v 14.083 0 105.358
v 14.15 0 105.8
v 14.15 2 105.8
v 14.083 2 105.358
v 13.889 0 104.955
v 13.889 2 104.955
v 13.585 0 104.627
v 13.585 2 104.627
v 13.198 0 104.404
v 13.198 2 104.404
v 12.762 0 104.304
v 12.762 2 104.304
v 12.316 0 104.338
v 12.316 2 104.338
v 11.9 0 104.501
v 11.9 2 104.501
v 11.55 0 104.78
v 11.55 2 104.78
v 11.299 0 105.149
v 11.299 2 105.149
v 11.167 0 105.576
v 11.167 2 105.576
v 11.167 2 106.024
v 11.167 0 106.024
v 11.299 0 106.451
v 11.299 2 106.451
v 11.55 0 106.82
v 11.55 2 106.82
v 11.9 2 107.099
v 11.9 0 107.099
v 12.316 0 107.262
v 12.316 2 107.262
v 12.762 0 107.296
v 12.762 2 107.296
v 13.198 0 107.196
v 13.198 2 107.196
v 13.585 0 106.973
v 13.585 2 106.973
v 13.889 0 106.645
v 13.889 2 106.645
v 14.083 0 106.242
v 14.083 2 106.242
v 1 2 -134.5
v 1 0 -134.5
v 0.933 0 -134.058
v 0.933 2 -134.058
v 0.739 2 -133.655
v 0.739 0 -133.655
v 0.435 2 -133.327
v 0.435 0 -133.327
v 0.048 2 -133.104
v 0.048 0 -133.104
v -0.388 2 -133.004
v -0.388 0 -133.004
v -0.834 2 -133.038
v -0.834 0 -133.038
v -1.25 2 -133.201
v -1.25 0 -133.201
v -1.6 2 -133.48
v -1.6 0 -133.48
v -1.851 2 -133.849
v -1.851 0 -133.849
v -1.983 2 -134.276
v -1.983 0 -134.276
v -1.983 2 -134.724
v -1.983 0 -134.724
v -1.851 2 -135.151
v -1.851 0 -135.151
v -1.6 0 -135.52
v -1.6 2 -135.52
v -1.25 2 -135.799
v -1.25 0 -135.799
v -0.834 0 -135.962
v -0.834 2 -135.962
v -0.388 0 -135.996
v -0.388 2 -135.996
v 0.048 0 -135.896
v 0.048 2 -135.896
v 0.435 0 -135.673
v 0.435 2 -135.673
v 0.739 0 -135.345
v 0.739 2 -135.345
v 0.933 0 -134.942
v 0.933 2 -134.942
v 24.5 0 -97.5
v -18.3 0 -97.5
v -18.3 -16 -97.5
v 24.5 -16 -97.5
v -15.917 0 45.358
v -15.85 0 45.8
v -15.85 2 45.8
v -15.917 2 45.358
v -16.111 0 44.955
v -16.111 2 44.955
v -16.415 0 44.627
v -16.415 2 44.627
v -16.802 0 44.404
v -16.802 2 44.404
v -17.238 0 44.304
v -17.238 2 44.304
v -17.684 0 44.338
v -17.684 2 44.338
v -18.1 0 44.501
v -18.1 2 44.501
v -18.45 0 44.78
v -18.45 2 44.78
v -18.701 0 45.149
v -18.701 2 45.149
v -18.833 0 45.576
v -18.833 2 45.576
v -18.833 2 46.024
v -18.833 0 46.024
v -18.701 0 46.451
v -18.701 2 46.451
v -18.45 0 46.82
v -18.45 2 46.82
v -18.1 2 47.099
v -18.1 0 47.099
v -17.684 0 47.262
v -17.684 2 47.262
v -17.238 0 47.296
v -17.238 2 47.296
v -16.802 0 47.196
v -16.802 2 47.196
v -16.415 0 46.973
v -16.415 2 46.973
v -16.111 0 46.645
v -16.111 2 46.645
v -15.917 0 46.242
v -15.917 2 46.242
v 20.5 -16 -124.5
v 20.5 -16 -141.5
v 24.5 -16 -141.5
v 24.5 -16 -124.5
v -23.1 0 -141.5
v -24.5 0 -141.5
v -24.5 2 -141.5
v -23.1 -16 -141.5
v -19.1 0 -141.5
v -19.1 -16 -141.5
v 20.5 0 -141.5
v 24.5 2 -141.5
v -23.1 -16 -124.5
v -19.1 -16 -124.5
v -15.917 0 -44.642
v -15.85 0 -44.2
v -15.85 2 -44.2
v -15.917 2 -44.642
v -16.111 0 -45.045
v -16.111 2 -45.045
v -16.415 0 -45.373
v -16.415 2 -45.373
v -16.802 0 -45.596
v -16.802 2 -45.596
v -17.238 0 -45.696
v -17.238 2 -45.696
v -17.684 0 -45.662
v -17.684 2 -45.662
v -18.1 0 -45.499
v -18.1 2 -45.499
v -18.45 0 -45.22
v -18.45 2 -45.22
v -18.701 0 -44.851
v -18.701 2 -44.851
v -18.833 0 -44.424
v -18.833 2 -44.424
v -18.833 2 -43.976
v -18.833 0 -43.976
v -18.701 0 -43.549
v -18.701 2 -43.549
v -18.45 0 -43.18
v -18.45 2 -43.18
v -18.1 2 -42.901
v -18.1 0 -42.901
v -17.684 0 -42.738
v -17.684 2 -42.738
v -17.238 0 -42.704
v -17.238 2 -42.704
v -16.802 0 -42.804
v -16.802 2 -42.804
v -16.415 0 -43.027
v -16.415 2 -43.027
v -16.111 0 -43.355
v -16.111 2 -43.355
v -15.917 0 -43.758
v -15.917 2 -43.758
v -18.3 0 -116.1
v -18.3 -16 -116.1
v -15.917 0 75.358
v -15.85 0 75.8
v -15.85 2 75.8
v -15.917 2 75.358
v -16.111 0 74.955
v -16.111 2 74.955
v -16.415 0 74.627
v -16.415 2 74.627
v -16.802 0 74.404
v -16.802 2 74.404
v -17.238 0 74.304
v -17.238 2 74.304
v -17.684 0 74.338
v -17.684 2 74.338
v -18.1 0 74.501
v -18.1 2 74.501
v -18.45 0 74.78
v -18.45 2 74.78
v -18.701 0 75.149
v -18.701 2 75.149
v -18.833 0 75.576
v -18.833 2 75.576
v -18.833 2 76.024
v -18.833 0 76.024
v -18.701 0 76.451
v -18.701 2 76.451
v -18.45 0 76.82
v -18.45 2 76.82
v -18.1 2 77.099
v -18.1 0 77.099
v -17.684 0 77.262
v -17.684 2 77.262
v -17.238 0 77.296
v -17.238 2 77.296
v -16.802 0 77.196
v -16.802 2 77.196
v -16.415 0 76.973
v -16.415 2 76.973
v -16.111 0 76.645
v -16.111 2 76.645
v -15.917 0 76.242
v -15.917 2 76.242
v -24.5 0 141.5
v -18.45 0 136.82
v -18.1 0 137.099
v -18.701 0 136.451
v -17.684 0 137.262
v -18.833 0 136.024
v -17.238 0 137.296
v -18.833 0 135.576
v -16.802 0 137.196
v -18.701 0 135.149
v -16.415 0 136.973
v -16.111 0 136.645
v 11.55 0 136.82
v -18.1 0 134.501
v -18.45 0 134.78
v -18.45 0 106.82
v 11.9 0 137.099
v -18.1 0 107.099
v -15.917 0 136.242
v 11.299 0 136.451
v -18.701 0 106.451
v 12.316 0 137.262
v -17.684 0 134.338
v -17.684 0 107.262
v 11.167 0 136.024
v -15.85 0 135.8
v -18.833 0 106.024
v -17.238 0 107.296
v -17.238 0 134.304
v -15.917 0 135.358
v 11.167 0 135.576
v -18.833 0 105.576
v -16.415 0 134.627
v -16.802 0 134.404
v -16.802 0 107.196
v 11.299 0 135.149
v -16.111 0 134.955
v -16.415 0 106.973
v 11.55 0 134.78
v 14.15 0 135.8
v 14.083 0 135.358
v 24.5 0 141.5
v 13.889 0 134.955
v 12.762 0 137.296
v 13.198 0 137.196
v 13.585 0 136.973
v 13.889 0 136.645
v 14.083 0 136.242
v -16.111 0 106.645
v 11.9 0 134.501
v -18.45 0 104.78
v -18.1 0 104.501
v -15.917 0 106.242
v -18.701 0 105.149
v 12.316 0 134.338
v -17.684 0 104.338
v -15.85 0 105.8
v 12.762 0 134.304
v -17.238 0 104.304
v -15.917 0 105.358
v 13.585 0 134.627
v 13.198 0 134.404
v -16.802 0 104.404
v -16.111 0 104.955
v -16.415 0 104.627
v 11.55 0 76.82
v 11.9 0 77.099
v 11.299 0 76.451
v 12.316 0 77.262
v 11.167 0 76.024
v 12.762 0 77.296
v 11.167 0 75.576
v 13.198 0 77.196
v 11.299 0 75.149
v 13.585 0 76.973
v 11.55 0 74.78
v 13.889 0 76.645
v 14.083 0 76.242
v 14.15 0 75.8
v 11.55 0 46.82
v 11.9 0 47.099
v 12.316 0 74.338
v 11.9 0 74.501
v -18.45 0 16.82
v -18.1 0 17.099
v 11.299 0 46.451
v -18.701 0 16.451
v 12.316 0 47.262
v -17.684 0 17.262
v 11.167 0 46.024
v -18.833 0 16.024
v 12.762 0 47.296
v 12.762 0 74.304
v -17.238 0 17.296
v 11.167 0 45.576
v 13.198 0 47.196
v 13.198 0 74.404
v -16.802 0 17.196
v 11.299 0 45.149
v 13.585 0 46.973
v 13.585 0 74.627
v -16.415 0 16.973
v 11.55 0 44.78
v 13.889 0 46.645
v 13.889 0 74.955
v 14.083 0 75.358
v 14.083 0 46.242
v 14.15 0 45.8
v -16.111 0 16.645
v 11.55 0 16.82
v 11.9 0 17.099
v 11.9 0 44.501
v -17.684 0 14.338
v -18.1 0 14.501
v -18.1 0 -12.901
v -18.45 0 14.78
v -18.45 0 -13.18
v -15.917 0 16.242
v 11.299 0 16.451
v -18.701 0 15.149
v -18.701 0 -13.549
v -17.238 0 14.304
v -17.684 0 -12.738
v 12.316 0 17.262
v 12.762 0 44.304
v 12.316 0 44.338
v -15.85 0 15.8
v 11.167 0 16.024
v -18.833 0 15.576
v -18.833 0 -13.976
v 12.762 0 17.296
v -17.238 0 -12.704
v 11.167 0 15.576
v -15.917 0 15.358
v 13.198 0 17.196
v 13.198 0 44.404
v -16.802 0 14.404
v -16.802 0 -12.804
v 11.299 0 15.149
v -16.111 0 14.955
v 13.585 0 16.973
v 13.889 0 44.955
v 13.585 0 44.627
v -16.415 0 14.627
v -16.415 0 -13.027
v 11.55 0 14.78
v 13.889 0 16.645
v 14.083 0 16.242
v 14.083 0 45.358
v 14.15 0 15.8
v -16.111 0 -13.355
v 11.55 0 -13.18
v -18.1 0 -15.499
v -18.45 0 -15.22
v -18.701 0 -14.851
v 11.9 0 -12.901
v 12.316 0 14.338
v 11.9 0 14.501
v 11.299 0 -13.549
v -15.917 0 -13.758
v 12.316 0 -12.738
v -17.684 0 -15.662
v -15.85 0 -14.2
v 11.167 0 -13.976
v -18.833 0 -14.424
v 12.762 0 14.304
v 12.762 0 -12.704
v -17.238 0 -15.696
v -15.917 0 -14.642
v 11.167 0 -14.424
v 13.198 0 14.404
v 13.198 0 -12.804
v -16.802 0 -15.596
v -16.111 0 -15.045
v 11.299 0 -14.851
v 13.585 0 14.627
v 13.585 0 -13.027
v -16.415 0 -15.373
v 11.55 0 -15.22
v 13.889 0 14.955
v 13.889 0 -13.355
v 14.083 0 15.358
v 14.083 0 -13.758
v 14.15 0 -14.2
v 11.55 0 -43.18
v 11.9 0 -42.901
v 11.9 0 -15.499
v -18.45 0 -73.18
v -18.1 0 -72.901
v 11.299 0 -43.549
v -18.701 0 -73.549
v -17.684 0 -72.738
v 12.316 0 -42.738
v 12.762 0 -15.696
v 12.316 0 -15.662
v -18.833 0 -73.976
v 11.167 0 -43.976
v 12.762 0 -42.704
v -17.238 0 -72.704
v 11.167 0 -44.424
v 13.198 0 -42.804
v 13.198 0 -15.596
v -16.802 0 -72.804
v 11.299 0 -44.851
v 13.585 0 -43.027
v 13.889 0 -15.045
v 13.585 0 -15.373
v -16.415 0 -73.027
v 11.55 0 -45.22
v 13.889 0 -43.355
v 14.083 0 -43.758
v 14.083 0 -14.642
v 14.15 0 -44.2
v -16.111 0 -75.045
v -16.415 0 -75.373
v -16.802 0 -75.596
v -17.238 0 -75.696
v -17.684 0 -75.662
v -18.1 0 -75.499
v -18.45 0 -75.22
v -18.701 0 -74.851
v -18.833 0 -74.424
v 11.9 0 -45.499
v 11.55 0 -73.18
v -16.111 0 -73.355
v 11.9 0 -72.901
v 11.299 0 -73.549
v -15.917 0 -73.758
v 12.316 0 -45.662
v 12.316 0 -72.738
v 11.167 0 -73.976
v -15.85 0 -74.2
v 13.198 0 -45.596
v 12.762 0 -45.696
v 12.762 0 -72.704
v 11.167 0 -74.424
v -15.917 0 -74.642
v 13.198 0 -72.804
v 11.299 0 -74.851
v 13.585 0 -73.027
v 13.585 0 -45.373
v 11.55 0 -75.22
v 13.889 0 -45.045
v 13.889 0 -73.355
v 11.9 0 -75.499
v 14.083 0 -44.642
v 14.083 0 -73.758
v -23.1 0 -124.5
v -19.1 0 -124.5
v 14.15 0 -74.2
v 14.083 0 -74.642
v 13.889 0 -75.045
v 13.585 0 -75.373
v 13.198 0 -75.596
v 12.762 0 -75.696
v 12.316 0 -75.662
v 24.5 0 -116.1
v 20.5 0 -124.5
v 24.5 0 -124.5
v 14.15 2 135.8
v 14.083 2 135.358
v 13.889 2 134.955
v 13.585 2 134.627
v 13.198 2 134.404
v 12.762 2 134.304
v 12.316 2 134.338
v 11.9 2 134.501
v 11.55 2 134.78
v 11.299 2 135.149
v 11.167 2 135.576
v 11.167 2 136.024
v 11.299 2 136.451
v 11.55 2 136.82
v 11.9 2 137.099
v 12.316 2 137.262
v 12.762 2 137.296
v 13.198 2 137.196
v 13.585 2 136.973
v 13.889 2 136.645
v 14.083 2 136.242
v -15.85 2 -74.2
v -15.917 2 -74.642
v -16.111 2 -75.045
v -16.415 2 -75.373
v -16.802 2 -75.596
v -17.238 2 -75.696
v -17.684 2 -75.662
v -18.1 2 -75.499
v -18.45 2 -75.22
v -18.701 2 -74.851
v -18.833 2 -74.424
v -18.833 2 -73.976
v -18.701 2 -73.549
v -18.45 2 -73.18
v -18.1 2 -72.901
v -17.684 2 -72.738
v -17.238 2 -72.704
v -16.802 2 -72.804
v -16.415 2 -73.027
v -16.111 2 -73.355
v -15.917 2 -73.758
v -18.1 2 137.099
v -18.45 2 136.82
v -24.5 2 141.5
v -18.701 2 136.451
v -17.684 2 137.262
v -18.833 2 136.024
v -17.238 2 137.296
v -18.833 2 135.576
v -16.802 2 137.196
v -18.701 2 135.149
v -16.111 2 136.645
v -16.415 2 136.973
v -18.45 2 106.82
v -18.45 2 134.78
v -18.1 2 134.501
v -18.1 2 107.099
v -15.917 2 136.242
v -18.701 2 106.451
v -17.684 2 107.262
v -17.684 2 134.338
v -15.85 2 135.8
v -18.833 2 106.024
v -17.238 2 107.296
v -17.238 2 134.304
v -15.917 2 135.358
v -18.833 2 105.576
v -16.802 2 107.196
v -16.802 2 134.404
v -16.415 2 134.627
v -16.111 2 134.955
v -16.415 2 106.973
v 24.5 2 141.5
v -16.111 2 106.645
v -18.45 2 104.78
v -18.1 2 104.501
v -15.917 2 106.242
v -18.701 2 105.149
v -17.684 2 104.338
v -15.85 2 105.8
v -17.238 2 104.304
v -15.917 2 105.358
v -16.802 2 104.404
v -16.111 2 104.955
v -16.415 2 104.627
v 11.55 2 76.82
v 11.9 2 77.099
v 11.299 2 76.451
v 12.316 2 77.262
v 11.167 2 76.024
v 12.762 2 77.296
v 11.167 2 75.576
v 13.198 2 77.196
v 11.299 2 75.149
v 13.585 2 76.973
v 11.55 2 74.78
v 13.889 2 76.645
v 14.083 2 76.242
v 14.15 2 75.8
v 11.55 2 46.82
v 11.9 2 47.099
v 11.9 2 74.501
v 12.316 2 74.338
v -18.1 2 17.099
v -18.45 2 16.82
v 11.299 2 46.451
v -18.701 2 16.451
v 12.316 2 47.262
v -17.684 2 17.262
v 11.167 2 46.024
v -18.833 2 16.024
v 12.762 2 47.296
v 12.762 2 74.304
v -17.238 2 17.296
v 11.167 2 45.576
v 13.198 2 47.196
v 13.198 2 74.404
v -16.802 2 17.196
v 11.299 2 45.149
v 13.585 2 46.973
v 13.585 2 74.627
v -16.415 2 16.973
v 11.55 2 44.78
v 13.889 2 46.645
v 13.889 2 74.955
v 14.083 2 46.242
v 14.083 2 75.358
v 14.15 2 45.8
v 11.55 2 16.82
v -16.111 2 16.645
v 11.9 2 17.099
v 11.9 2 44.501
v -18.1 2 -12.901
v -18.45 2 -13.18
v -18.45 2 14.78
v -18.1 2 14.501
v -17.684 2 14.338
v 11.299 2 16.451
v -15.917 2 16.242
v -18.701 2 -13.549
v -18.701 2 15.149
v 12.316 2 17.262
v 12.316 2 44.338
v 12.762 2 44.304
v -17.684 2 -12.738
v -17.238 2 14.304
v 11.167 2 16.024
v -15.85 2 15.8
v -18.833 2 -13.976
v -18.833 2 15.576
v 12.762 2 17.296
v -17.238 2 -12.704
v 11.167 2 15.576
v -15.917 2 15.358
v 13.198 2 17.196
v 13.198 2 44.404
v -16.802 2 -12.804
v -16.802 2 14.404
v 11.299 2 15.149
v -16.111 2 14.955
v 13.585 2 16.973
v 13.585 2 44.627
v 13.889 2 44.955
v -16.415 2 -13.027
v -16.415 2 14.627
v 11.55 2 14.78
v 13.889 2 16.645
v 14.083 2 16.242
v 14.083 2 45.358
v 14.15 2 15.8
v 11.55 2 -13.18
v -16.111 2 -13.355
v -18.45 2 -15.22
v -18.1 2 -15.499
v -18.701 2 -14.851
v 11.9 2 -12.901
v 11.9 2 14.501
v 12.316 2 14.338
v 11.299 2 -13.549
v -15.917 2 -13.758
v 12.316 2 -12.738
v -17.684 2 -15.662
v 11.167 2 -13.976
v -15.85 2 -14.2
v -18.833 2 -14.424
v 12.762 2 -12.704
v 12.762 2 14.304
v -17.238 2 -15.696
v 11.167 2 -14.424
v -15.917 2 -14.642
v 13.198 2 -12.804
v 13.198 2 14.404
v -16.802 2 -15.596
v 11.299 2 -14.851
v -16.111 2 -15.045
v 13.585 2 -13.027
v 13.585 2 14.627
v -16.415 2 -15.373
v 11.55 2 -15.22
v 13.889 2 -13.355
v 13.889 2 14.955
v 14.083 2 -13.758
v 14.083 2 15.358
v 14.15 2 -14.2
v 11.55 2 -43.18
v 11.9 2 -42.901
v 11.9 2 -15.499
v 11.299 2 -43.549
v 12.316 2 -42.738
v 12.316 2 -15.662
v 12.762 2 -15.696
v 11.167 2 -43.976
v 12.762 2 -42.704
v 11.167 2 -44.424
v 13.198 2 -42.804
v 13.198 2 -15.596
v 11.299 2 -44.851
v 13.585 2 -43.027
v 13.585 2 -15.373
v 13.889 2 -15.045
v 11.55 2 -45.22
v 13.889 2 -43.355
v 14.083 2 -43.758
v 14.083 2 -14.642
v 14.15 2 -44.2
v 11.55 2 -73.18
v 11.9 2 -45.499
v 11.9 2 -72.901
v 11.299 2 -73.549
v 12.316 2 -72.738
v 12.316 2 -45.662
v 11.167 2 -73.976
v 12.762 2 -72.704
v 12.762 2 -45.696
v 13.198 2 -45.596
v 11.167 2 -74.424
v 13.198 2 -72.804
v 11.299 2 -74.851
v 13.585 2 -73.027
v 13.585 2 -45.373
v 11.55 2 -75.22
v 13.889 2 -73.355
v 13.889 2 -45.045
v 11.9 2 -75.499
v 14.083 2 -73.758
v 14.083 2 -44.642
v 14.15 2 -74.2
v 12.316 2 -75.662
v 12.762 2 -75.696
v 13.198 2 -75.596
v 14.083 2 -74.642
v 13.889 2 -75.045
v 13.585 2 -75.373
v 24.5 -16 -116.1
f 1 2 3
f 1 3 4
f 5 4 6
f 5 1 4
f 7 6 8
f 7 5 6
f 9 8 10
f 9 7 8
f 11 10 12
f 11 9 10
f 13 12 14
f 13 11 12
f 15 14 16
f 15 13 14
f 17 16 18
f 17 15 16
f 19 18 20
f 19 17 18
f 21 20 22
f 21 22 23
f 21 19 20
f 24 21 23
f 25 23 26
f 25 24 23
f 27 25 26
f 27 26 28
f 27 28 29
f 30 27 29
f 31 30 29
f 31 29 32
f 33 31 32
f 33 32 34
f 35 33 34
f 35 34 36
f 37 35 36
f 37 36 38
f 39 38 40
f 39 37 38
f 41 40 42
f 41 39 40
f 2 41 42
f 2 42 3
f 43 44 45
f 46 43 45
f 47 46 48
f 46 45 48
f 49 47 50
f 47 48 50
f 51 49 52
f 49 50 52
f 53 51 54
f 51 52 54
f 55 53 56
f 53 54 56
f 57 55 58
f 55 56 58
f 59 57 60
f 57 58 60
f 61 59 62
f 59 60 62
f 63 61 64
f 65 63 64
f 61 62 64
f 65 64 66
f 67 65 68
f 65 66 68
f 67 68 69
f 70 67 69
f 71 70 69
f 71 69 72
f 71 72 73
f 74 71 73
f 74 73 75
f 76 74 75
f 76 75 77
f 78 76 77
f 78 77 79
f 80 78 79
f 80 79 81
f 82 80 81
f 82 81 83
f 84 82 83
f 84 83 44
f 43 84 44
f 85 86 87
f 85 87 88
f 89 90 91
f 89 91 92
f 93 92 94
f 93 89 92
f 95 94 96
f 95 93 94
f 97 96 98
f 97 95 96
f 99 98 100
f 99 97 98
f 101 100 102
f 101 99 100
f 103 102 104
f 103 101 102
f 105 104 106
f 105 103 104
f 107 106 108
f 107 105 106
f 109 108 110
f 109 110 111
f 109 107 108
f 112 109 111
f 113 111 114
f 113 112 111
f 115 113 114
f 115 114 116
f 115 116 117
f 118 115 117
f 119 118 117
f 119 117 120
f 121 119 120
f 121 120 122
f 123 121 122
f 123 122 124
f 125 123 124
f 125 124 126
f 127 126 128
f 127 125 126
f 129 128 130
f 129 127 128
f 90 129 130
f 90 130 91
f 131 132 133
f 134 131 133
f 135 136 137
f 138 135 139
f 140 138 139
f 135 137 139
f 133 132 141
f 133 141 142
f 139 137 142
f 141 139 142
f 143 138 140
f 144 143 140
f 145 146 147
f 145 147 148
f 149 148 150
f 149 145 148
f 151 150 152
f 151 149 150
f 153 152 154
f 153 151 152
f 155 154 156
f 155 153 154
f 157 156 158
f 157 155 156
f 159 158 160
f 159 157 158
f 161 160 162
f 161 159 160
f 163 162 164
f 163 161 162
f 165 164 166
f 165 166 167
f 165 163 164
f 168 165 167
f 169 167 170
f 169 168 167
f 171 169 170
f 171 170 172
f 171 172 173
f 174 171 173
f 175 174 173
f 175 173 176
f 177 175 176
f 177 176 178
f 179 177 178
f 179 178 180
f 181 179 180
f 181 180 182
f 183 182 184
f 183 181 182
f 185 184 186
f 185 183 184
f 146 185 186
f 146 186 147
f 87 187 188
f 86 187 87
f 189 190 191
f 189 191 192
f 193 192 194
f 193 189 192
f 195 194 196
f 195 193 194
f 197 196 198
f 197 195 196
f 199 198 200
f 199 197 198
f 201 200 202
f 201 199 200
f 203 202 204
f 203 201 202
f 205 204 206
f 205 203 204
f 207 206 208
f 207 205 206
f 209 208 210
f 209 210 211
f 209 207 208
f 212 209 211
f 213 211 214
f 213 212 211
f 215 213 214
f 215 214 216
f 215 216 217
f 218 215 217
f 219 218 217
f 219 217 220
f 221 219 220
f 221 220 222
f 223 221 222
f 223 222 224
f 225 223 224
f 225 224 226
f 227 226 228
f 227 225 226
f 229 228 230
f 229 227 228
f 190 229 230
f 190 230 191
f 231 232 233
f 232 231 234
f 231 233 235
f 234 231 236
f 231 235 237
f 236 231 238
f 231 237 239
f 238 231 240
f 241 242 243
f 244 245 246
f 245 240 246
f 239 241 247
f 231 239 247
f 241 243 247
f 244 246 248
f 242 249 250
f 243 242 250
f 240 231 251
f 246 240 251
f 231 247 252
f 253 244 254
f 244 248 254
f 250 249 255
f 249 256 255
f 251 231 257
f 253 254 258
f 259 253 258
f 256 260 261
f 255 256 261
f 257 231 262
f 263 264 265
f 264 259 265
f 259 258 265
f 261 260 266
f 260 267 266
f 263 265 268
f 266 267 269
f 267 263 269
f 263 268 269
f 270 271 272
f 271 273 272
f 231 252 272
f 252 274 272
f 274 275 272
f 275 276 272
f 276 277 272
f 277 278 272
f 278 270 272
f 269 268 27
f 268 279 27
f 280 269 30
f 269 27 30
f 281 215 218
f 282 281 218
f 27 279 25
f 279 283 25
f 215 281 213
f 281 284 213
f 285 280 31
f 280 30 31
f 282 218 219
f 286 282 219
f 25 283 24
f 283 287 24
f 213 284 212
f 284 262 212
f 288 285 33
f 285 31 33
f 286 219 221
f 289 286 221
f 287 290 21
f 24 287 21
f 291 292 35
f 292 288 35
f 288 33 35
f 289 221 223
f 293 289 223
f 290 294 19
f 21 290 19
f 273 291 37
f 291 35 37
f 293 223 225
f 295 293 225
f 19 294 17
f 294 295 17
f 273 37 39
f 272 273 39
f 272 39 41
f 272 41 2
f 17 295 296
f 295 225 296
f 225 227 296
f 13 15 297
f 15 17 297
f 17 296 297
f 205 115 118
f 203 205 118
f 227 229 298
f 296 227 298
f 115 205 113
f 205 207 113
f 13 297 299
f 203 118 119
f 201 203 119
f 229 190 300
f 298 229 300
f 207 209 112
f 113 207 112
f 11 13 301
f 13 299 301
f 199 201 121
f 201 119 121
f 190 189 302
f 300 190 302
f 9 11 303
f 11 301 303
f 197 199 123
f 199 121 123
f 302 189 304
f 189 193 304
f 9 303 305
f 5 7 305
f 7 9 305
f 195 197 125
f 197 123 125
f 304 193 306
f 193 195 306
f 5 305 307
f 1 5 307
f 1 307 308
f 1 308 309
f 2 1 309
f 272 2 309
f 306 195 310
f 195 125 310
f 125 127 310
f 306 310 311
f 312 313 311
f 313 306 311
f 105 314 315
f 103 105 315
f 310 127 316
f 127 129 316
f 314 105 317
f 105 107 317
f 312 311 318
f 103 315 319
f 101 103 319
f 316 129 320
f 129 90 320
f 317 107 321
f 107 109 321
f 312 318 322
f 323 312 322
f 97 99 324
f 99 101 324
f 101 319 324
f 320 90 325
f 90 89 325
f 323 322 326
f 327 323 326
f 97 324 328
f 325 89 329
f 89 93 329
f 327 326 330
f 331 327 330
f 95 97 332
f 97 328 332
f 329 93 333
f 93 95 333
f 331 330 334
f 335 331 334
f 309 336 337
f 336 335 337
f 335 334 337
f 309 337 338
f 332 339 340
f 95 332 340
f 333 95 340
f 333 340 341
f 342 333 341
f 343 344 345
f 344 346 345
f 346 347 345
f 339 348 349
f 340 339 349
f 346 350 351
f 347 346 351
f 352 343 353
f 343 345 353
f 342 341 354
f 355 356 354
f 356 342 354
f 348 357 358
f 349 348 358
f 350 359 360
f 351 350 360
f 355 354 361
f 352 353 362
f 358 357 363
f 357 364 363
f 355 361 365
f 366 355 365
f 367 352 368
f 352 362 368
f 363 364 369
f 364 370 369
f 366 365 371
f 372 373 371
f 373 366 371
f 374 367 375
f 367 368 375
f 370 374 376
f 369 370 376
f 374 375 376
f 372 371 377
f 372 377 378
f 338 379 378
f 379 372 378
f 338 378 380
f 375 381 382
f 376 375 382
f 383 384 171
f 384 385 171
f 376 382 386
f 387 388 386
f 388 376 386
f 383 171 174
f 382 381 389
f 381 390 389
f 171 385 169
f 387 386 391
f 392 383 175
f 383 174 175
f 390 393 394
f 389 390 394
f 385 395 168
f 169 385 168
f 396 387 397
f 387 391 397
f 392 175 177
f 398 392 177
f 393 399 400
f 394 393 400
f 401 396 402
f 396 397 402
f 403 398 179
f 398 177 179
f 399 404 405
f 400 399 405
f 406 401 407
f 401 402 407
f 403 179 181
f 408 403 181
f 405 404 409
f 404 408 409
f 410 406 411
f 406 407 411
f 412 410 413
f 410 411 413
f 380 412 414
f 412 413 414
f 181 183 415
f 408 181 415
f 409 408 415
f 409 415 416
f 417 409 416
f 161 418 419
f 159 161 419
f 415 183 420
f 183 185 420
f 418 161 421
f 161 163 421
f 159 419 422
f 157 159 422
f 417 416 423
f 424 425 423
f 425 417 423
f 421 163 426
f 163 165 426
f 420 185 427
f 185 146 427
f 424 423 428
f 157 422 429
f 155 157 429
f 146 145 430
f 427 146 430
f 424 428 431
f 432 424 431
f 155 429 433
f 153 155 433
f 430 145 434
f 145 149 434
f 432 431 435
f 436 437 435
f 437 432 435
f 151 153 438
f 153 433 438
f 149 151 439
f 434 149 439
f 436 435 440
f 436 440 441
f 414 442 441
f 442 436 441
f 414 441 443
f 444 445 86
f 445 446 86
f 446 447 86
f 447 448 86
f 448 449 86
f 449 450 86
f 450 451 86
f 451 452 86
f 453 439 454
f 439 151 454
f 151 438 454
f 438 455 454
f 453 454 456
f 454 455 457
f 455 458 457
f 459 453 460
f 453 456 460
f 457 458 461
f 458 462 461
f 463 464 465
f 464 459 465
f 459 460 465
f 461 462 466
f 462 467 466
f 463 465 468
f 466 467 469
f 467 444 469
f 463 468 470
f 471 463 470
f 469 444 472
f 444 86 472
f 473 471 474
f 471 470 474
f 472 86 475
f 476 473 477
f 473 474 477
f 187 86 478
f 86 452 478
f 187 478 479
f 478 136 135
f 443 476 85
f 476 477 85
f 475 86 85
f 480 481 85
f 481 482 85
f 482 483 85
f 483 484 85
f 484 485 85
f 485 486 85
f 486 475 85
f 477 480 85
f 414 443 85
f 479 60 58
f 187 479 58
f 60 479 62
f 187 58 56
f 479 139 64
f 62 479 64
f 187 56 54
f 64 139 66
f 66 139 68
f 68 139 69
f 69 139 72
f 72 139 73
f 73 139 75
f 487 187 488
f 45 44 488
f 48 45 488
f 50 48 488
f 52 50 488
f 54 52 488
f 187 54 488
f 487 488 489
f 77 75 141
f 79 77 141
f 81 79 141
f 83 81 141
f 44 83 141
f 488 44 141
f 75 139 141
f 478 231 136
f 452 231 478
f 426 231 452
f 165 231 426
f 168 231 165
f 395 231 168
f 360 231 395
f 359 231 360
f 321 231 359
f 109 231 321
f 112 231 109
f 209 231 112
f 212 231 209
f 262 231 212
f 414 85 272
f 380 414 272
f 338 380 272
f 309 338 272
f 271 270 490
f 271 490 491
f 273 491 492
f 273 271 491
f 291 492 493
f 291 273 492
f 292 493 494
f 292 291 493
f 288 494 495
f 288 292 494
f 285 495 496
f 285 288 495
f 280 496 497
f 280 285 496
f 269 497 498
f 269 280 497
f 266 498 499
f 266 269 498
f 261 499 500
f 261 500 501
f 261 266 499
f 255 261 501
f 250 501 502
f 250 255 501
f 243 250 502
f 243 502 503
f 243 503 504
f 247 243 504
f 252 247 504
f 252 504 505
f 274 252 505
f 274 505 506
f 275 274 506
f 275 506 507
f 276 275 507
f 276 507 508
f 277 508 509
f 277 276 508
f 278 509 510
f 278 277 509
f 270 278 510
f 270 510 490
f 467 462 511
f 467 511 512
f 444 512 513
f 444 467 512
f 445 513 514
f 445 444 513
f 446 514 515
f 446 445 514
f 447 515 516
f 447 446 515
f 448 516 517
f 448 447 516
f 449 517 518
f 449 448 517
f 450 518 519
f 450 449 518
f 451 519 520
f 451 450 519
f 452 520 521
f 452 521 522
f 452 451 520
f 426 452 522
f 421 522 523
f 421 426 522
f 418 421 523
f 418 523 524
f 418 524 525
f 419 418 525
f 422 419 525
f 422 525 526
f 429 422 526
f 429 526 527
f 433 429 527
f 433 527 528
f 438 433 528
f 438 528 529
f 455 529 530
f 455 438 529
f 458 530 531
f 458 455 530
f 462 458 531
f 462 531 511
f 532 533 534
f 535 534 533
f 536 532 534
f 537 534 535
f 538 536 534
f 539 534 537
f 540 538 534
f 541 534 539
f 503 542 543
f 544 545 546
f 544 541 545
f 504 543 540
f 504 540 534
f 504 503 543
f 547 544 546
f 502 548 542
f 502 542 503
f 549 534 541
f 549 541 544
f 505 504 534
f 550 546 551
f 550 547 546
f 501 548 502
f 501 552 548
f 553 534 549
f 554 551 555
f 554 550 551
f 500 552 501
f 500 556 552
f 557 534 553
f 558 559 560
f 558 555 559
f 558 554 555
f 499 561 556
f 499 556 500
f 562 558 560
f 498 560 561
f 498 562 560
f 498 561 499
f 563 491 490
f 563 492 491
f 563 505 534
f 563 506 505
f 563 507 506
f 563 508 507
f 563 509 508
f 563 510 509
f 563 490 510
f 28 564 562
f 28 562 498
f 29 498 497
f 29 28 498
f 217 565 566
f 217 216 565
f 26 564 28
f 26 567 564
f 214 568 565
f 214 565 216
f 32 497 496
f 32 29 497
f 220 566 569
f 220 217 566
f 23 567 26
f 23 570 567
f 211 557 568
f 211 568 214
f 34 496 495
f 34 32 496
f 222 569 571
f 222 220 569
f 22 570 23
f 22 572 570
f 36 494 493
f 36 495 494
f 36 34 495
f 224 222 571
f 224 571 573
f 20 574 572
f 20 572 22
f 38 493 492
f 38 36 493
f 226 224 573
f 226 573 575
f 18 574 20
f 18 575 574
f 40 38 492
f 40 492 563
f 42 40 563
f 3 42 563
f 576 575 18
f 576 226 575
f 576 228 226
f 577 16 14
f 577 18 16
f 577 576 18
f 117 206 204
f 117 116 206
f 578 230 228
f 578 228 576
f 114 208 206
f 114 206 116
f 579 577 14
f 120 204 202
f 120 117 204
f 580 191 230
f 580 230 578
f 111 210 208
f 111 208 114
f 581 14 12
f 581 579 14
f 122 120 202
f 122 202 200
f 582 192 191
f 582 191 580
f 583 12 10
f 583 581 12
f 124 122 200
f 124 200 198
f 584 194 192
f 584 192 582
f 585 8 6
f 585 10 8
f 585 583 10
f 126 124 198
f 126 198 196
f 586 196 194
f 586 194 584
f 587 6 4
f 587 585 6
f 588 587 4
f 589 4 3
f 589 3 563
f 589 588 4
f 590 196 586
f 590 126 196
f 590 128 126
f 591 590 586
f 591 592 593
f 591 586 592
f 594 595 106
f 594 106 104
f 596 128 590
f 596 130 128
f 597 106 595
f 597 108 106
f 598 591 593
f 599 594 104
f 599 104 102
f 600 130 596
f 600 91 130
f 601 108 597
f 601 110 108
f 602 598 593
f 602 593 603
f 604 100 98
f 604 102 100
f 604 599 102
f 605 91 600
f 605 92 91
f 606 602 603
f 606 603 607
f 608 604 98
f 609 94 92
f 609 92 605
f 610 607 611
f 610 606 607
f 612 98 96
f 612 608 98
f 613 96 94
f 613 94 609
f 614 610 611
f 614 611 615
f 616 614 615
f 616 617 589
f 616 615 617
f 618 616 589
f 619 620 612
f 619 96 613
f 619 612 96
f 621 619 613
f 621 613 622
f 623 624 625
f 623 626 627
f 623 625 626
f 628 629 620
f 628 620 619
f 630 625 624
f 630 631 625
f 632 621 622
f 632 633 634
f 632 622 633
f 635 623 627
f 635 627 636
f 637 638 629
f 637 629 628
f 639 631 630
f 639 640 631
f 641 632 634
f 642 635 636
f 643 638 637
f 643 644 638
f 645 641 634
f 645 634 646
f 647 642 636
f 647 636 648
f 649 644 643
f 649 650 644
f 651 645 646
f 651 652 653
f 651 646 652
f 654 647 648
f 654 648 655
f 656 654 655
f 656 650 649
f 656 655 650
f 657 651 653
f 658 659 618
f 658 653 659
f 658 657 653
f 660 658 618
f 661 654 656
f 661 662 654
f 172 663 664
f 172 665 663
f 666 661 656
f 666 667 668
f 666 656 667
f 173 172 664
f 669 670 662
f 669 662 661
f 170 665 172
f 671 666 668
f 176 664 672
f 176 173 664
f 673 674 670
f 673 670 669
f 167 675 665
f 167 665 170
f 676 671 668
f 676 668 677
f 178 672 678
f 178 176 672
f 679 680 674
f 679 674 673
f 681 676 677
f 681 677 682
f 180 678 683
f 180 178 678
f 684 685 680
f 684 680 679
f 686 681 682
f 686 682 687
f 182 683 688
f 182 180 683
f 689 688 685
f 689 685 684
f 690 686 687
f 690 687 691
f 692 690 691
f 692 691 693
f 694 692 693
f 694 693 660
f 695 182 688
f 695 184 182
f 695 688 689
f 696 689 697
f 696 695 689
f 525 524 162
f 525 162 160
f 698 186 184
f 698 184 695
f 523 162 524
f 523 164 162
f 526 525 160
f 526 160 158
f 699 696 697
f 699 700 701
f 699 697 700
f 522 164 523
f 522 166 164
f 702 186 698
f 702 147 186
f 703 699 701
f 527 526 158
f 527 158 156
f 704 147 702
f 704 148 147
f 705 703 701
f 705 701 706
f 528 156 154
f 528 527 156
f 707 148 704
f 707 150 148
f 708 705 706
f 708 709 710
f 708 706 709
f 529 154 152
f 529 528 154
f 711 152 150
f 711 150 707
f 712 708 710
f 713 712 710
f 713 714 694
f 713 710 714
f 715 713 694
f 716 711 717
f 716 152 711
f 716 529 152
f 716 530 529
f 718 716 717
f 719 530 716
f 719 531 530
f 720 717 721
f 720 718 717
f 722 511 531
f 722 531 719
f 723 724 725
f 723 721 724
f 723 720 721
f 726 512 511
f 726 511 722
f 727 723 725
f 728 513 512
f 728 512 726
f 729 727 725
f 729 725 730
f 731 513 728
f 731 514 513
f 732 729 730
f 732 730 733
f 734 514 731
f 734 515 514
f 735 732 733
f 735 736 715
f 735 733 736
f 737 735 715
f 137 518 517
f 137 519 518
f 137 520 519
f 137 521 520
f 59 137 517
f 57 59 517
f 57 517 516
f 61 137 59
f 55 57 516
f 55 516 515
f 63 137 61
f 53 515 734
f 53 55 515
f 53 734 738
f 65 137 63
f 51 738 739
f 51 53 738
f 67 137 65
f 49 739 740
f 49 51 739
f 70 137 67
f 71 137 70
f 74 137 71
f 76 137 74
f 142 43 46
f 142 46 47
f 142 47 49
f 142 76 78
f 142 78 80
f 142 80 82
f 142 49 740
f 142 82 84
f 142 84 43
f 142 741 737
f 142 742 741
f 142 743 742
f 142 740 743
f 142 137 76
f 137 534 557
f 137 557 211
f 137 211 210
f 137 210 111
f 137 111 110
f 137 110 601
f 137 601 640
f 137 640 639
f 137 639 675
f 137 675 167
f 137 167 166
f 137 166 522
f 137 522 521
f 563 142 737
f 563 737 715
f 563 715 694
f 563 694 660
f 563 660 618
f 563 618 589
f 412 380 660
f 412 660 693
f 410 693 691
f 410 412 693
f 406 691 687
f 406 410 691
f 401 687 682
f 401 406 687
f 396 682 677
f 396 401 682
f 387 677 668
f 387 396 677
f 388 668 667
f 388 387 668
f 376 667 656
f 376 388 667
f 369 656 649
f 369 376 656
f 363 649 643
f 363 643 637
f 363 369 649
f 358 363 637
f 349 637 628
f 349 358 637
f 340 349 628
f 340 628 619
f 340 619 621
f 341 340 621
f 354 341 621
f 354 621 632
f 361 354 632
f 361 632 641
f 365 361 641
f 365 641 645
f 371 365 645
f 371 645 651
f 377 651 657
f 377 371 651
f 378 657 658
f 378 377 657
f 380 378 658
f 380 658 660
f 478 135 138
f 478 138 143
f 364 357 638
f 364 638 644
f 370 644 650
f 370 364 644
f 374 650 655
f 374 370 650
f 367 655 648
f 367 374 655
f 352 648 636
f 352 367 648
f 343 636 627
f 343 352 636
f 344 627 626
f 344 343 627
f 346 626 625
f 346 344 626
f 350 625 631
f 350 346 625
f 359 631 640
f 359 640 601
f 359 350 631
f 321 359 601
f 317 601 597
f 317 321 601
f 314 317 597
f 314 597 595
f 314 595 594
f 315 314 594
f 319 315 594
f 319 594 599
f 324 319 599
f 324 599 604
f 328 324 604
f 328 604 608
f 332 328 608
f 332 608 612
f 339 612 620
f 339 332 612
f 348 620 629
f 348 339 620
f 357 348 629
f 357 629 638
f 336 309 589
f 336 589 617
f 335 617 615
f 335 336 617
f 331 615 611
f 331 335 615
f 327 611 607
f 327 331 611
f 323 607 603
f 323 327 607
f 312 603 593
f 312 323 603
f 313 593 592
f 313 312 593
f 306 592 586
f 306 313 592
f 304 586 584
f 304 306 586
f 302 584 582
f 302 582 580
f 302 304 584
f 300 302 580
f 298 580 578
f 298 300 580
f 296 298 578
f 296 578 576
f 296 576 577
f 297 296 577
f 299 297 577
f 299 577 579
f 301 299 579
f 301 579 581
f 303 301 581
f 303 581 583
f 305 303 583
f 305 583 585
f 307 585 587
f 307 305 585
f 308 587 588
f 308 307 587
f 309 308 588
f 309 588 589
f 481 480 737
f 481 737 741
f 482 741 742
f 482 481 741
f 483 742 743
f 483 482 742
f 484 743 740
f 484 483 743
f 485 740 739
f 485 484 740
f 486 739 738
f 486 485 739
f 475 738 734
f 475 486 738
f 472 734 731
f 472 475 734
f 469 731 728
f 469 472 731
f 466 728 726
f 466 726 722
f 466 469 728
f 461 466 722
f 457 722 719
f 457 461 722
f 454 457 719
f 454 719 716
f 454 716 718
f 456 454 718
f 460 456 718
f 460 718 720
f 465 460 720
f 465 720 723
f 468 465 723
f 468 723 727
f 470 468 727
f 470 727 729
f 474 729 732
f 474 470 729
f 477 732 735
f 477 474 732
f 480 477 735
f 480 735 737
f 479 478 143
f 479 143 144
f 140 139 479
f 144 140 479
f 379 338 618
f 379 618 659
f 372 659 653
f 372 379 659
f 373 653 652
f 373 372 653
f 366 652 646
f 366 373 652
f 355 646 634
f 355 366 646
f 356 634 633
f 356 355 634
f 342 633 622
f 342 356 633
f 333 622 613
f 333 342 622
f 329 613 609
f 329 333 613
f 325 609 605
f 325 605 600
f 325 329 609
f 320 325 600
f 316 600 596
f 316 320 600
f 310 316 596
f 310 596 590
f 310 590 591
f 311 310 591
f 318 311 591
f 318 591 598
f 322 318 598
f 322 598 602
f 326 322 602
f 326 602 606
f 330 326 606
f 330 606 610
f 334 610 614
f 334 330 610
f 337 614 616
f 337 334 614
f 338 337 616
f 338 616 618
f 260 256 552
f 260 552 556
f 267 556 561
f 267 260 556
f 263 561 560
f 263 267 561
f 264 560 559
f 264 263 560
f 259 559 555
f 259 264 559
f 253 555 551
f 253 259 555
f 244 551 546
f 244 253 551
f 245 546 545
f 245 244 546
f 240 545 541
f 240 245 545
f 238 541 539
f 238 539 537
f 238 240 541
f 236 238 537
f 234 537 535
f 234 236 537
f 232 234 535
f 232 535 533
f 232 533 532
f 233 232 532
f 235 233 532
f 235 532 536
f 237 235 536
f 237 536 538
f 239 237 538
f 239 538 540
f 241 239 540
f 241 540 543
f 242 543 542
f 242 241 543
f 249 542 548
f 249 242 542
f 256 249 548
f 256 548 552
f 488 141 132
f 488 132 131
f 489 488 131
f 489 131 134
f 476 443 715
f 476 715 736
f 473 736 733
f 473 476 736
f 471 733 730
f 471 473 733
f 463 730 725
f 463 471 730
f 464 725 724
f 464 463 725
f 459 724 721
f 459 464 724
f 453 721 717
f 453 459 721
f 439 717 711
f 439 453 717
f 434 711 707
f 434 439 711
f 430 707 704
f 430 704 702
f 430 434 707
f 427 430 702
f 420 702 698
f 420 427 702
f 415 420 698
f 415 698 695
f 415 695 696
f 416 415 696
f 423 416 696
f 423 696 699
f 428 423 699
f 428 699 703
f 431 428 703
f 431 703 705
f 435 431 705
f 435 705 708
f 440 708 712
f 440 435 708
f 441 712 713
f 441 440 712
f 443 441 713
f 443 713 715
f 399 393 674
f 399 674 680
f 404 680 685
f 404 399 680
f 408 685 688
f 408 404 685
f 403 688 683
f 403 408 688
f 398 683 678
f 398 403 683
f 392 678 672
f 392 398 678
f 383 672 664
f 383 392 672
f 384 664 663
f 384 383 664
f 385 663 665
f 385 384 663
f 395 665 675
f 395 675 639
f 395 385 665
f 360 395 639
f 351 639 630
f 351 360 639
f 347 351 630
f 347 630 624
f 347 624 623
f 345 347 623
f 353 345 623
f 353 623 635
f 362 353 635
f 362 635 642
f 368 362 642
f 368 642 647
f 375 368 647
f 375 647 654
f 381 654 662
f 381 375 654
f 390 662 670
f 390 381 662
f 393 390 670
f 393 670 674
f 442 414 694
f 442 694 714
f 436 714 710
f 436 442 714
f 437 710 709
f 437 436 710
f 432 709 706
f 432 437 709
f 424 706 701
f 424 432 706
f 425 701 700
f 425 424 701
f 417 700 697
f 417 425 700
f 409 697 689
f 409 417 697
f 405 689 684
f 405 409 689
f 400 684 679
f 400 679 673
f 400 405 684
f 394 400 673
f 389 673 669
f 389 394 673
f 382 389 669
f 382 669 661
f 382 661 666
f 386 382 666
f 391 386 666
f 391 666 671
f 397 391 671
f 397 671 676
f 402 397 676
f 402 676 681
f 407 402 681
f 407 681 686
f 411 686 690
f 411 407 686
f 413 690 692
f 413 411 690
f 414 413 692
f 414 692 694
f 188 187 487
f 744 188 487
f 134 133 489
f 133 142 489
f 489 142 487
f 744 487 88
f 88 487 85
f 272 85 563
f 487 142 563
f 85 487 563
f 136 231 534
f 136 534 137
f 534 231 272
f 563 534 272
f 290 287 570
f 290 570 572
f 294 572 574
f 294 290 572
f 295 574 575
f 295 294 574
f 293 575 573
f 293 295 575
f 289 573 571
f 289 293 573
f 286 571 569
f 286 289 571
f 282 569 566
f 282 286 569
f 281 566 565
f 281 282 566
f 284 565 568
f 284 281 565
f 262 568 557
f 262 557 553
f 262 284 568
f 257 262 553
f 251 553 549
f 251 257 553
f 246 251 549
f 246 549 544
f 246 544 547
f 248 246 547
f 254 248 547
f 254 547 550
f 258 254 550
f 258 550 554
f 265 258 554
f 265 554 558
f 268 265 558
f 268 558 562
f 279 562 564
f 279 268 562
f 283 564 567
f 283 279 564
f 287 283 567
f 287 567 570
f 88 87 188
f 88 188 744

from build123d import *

# Parameters (mm, degrees)
ESQUISSE1_W             = 49
ESQUISSE1_H             = 283
ESQUISSE1_R             = 1.5
BOSS_EXTRU_1_DEPTH      = 2
ESQUISSE2_W             = 42.8
ESQUISSE2_H             = 18.6
ESQUISSE2_W_2           = 4
ESQUISSE2_H_2           = 17
BOSS_EXTRU_2_DEPTH      = 16
ESQUISSE3_R             = 1.5
ENL_V_MAT_EXTRU_1_DEPTH = 16


with BuildPart() as part:
    # Esquisse1 → Boss.-Extru.1 (new body)
    with BuildSketch(Plane(origin=(0, 0, 0), x_dir=(1, 0, 0), z_dir=(0, 1, 0))):
        Rectangle(ESQUISSE1_W, ESQUISSE1_H)
        with Locations((12.65, 74.2)):
            Circle(ESQUISSE1_R, mode=Mode.SUBTRACT)
        with Locations((-17.35, 74.2)):
            Circle(ESQUISSE1_R, mode=Mode.SUBTRACT)
        with Locations((-17.35, 44.2)):
            Circle(ESQUISSE1_R, mode=Mode.SUBTRACT)
        with Locations((-17.35, 14.2)):
            Circle(ESQUISSE1_R, mode=Mode.SUBTRACT)
        with Locations((-17.35, -15.8)):
            Circle(ESQUISSE1_R, mode=Mode.SUBTRACT)
        with Locations((-17.35, -45.8)):
            Circle(ESQUISSE1_R, mode=Mode.SUBTRACT)
        with Locations((-17.35, -75.8)):
            Circle(ESQUISSE1_R, mode=Mode.SUBTRACT)
        with Locations((-17.35, -105.8)):
            Circle(ESQUISSE1_R, mode=Mode.SUBTRACT)
        with Locations((-17.35, -135.8)):
            Circle(ESQUISSE1_R, mode=Mode.SUBTRACT)
        with Locations((12.65, 44.2)):
            Circle(ESQUISSE1_R, mode=Mode.SUBTRACT)
        with Locations((12.65, 14.2)):
            Circle(ESQUISSE1_R, mode=Mode.SUBTRACT)
        with Locations((12.65, -15.8)):
            Circle(ESQUISSE1_R, mode=Mode.SUBTRACT)
        with Locations((12.65, -45.8)):
            Circle(ESQUISSE1_R, mode=Mode.SUBTRACT)
        with Locations((12.65, -75.8)):
            Circle(ESQUISSE1_R, mode=Mode.SUBTRACT)
        with Locations((12.65, -105.8)):
            Circle(ESQUISSE1_R, mode=Mode.SUBTRACT)
        with Locations((12.65, -135.8)):
            Circle(ESQUISSE1_R, mode=Mode.SUBTRACT)
    extrude(amount=BOSS_EXTRU_1_DEPTH)

    # Esquisse2 → Boss.-Extru.2 (add)
    with BuildSketch(Plane.XZ):
        with Locations((3.1, -106.8)):
            Rectangle(ESQUISSE2_W, ESQUISSE2_H)
        with Locations((-21.1, -133)):
            Rectangle(ESQUISSE2_W_2, ESQUISSE2_H_2)
        with Locations((22.5, -133)):
            Rectangle(ESQUISSE2_W_2, ESQUISSE2_H_2)
    extrude(amount=BOSS_EXTRU_2_DEPTH)

    # Esquisse3 → Enlèv. mat.-Extru.1 (cut)
    with BuildSketch(Plane.XZ):
        with Locations((-0.5, -134.5)):
            Circle(ESQUISSE3_R)
    extrude(amount=-ENL_V_MAT_EXTRU_1_DEPTH, mode=Mode.SUBTRACT)


solid = part.part
